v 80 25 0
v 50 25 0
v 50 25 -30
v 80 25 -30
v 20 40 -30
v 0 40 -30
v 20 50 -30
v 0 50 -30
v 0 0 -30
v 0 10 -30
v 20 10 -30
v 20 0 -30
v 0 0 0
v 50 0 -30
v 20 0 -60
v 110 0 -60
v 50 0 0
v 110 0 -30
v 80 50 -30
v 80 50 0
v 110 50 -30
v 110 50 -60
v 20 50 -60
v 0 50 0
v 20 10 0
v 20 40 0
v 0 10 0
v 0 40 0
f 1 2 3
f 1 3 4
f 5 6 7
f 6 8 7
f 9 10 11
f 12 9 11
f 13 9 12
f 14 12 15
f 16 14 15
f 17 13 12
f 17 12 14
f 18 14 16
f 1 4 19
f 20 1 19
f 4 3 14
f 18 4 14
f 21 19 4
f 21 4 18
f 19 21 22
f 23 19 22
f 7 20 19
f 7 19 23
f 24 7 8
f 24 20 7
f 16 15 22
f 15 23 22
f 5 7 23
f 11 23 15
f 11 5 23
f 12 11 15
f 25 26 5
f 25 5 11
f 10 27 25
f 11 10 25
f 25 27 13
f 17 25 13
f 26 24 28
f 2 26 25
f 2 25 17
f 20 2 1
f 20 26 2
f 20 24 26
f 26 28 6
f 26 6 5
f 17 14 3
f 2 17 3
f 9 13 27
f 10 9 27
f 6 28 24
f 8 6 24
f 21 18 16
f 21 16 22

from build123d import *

# Parameters (mm, degrees)
F0_W     = 20
F0_H     = 10
F0_W_2   = 30
F0_H_2   = 25
F1_DEPTH = 30
F2_START = -30
F2_DEPTH = 30


with BuildPart() as f1:
    # F0 (on Top) → F1 (new body)
    with BuildSketch(Plane.XY):
        with Locations((10, 5)):
            Rectangle(F0_W, F0_H)
        with Locations((10, 45)):
            Rectangle(F0_W, F0_H)
        Polygon((20, 10), (20, 0), (50, 0), (50, 25), (50, 50), (20, 50), (20, 40), align=None)
        with Locations((65, 37.5)):
            Rectangle(F0_W_2, F0_H_2)
    extrude(amount=-F1_DEPTH)

    # F0 (on Top) → F2 (join)
    with BuildSketch(Plane.XY.offset(F2_START)):
        Polygon((20, 10), (20, 0), (50, 0), (50, 25), (50, 50), (20, 50), (20, 40), align=None)
        with Locations((65, 37.5)):
            Rectangle(F0_W_2, F0_H_2)
        Polygon((80, 25), (80, 0), (110, 0), (110, 50), (80, 50), align=None)
        with Locations((65, 12.5)):
            Rectangle(F0_W_2, F0_H_2)
    extrude(amount=-F2_DEPTH)


solid = f1.part
